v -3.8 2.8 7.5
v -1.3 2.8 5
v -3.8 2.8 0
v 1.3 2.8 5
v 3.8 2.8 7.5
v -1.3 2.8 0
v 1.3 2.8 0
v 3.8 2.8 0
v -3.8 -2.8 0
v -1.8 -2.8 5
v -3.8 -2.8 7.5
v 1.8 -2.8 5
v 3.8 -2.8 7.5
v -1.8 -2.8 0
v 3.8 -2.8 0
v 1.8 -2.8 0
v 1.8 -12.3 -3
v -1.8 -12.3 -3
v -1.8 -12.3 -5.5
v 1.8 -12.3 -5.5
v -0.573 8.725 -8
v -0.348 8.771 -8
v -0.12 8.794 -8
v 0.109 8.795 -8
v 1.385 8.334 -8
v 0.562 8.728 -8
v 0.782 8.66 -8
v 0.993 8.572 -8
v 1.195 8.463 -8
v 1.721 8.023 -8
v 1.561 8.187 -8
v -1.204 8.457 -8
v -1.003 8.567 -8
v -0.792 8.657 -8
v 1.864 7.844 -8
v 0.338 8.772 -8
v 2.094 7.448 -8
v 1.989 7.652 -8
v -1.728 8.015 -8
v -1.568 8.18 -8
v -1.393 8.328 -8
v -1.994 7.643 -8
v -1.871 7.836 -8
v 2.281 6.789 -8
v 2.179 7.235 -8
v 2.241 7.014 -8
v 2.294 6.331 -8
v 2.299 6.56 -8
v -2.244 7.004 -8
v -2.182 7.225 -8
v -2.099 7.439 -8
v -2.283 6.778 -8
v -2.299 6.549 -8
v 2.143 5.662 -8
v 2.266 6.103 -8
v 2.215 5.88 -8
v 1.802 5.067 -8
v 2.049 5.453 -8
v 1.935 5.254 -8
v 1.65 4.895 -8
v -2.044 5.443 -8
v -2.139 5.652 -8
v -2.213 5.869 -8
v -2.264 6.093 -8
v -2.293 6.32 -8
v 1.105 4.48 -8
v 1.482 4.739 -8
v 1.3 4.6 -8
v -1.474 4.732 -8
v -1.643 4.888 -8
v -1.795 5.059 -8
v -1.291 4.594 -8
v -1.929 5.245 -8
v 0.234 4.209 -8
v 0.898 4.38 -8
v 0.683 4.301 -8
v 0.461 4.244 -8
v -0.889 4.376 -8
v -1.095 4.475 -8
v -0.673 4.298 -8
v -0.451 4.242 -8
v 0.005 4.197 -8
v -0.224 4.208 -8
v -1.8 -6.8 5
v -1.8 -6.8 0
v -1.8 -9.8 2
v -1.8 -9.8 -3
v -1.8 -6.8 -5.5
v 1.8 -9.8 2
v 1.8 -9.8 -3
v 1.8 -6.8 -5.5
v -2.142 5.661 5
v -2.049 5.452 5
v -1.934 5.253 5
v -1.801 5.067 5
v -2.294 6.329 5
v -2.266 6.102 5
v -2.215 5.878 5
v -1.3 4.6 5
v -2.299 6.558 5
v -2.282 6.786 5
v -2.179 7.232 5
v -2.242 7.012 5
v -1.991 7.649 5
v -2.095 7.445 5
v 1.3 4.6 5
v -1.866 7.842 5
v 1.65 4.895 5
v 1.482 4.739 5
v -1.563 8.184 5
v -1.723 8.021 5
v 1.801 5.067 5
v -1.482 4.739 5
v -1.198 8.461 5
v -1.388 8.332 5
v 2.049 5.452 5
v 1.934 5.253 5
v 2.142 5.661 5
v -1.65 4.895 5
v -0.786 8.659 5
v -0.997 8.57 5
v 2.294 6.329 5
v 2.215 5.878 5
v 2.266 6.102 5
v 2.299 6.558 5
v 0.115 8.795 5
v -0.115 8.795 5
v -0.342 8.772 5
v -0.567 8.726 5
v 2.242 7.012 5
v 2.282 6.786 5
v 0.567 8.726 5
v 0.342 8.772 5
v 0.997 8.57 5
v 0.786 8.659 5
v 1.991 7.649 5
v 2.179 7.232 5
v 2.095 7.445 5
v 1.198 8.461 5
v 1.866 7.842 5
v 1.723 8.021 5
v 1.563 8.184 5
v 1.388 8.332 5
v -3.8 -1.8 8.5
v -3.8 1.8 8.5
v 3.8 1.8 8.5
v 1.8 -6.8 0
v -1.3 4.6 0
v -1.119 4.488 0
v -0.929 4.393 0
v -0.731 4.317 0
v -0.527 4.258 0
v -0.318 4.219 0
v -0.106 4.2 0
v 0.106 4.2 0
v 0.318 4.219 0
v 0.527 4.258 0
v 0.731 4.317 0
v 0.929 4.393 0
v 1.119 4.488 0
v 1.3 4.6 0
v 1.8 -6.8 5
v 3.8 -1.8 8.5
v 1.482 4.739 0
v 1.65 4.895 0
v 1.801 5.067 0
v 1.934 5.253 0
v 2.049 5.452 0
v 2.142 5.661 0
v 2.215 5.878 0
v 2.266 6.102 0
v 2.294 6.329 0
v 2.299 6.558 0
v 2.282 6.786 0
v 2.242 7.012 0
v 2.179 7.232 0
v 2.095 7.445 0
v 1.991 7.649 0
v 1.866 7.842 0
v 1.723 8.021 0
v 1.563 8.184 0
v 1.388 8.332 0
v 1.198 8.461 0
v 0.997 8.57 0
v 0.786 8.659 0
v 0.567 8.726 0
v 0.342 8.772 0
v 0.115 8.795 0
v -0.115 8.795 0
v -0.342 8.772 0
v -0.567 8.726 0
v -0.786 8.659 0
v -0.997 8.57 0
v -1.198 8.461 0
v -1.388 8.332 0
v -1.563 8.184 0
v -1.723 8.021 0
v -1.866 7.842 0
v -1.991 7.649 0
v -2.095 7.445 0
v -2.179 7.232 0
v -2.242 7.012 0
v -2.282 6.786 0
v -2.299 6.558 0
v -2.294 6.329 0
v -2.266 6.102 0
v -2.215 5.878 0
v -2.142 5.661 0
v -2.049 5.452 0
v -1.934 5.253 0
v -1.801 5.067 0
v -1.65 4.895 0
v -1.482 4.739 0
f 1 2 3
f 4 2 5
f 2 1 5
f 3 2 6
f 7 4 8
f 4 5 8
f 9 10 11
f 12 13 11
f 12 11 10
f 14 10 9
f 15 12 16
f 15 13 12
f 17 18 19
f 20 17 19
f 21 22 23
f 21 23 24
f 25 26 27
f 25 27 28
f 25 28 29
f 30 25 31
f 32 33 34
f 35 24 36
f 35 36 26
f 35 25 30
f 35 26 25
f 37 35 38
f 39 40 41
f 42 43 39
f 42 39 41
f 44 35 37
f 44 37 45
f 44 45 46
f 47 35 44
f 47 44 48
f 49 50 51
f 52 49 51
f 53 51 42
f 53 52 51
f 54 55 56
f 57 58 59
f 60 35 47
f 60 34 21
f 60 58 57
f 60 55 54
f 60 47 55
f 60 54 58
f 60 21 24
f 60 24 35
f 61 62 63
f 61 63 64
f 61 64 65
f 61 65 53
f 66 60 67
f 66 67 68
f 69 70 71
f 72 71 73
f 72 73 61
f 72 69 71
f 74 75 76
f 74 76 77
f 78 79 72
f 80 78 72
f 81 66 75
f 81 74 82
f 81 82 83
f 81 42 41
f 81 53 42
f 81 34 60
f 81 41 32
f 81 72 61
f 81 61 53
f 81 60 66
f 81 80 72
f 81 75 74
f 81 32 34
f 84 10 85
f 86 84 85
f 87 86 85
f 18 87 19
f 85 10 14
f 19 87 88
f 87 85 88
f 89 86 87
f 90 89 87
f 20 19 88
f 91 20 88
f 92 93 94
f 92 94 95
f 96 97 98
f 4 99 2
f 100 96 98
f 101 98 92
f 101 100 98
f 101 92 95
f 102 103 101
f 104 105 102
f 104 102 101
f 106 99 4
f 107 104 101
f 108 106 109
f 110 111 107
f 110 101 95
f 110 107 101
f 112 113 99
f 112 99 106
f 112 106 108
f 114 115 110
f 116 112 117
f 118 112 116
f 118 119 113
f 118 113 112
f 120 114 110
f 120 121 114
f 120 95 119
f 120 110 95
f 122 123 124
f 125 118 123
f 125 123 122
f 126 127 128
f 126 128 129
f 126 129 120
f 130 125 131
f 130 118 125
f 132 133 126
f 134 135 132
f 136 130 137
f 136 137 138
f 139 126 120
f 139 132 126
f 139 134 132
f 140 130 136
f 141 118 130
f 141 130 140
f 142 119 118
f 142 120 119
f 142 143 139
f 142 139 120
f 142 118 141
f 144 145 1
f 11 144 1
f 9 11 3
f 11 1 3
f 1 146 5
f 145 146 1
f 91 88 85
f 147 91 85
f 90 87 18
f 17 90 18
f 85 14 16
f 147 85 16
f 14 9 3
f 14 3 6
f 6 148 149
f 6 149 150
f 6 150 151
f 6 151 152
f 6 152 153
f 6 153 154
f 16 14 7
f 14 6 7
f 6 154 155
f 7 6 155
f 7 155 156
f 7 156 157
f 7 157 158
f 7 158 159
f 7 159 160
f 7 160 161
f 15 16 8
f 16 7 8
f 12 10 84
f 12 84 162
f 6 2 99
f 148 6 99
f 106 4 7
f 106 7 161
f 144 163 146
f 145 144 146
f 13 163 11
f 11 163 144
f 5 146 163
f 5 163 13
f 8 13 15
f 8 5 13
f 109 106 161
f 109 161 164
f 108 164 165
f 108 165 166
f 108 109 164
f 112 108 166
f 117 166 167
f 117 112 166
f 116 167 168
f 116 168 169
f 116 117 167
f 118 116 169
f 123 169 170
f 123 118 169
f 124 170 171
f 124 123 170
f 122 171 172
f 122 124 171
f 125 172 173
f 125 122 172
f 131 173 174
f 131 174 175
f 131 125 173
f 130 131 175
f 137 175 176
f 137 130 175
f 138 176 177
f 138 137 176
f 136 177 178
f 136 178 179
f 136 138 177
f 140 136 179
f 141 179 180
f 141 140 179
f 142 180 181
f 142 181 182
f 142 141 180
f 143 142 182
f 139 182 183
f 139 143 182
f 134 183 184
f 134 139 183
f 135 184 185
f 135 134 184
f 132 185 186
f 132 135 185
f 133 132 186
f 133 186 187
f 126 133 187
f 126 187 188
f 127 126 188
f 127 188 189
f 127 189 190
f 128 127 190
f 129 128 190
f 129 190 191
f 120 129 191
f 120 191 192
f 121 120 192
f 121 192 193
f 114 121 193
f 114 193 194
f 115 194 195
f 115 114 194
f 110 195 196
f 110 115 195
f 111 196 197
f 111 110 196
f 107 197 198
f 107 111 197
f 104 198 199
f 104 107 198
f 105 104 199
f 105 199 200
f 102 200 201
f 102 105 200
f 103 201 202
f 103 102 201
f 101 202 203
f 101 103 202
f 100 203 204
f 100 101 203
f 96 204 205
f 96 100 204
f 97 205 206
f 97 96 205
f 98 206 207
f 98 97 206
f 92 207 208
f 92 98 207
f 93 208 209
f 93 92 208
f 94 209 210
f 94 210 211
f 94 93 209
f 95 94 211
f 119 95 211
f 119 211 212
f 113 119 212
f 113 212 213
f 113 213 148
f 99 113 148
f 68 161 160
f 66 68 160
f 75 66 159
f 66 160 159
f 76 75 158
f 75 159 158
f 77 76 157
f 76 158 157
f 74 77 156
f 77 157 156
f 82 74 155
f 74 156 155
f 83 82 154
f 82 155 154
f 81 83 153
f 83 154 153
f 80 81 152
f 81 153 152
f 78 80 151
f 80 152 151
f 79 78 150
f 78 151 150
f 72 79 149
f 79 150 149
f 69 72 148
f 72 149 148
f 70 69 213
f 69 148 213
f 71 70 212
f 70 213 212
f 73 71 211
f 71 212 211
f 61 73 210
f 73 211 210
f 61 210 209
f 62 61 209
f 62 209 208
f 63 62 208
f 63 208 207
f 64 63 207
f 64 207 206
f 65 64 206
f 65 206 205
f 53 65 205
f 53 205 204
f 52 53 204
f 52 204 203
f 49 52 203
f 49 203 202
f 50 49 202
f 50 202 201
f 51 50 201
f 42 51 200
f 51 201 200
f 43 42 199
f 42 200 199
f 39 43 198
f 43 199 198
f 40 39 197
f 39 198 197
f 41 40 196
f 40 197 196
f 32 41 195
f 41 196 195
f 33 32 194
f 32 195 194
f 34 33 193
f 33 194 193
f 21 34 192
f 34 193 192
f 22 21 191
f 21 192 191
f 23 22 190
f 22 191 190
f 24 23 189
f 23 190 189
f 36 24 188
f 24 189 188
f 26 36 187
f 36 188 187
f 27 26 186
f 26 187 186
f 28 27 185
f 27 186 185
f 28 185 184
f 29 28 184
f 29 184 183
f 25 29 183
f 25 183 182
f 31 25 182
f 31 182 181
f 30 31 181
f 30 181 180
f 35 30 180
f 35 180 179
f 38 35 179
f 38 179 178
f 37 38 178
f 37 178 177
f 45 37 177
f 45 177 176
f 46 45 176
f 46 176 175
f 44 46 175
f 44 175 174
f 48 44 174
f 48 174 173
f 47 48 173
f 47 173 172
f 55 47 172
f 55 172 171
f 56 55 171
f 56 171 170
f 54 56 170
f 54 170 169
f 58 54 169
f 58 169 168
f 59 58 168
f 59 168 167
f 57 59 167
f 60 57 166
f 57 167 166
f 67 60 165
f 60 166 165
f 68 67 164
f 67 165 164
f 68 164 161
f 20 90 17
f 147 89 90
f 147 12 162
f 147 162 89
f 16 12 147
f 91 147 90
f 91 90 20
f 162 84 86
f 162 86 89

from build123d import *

# Parameters (mm, degrees)
SZKIC1_W                    = 7.6
SZKIC1_H                    = 5.6
DODANIE_WYCI_GNI_CIE1_DEPTH = 5
SZKIC2_R                    = 2.3
SZKIC2_W                    = 2.6
SZKIC2_H                    = 1.8
DODANIE_WYCI_GNI_CIE2_DEPTH = 5
SZKIC3_W                    = 3.6
SZKIC3_H                    = 7
DODANIE_WYCI_GNI_CIE3_DEPTH = 5
SZKIC4_R                    = 2.3
DODANIE_WYCI_GNI_CIE4_DEPTH = 8
SFAZOWANIE1_SIZE            = 3
SZKIC5_W                    = 3.5
SZKIC5_H                    = 5.6
DODANIE_WYCI_GNI_CIE5_DEPTH = 7.6
DODANIE_WYCI_GNI_CIE6_DEPTH = 3.6
SFAZOWANIE3_SIZE            = 1


with BuildPart() as part:
    # Szkic1 → Dodanie-wyciągnięcie1 (new body)
    with BuildSketch(Plane.XY):
        Rectangle(SZKIC1_W, SZKIC1_H)
    extrude(amount=DODANIE_WYCI_GNI_CIE1_DEPTH)

    # Szkic2 → Dodanie-wyciągnięcie2 (add)
    with BuildSketch(Plane.XY.offset(5)):
        with Locations((0, 6.497366596)):
            Circle(SZKIC2_R)
        with Locations((0, 3.7)):
            Rectangle(SZKIC2_W, SZKIC2_H)
    extrude(amount=-DODANIE_WYCI_GNI_CIE2_DEPTH)

    # Szkic3 → Dodanie-wyciągnięcie3 (add)
    with BuildSketch(Plane.XY.offset(5)):
        with Locations((0, -6.3)):
            Rectangle(SZKIC3_W, SZKIC3_H)
    extrude(amount=-DODANIE_WYCI_GNI_CIE3_DEPTH)

    # Szkic4 → Dodanie-wyciągnięcie4 (add)
    with BuildSketch(Plane(origin=(0, 0, 0), x_dir=(-1, 0, 0), z_dir=(0, 0, -1))):
        with Locations(Location((0, 6.497366596, 0), (0, 0, 235.58261129))):
            Circle(SZKIC4_R)
    extrude(amount=DODANIE_WYCI_GNI_CIE4_DEPTH)

    # Sfazowanie1
    sfazowanie1_edges = [part.edges().sort_by_distance(p)[0] for p in [
        (0, -9.8, 5),
    ]]
    chamfer(sfazowanie1_edges, length=SFAZOWANIE1_SIZE)

    # Szkic5 → Dodanie-wyciągnięcie5 (add)
    with BuildSketch(Plane(origin=(3.8, 0, 0), x_dir=(0, 0, -1), z_dir=(1, 0, 0))):
        with Locations((-6.75, 0)):
            Rectangle(SZKIC5_W, SZKIC5_H)
    extrude(amount=-DODANIE_WYCI_GNI_CIE5_DEPTH)

    # Szkic6 → Dodanie-wyciągnięcie6 (add)
    with BuildSketch(Plane.ZY.offset(1.8)):
        Polygon((0, -9.8), (-3, -9.8), (-3, -12.3), (-5.5, -12.3), (-5.5, -6.8), (0, -6.8), align=None)
    extrude(amount=-DODANIE_WYCI_GNI_CIE6_DEPTH)

    # Sfazowanie3
    sfazowanie3_edges = [part.edges().sort_by_distance(p)[0] for p in [
        (0, -2.8, 8.5),
        (0, 2.8, 8.5),
    ]]
    chamfer(sfazowanie3_edges, length=SFAZOWANIE3_SIZE)


solid = part.part
